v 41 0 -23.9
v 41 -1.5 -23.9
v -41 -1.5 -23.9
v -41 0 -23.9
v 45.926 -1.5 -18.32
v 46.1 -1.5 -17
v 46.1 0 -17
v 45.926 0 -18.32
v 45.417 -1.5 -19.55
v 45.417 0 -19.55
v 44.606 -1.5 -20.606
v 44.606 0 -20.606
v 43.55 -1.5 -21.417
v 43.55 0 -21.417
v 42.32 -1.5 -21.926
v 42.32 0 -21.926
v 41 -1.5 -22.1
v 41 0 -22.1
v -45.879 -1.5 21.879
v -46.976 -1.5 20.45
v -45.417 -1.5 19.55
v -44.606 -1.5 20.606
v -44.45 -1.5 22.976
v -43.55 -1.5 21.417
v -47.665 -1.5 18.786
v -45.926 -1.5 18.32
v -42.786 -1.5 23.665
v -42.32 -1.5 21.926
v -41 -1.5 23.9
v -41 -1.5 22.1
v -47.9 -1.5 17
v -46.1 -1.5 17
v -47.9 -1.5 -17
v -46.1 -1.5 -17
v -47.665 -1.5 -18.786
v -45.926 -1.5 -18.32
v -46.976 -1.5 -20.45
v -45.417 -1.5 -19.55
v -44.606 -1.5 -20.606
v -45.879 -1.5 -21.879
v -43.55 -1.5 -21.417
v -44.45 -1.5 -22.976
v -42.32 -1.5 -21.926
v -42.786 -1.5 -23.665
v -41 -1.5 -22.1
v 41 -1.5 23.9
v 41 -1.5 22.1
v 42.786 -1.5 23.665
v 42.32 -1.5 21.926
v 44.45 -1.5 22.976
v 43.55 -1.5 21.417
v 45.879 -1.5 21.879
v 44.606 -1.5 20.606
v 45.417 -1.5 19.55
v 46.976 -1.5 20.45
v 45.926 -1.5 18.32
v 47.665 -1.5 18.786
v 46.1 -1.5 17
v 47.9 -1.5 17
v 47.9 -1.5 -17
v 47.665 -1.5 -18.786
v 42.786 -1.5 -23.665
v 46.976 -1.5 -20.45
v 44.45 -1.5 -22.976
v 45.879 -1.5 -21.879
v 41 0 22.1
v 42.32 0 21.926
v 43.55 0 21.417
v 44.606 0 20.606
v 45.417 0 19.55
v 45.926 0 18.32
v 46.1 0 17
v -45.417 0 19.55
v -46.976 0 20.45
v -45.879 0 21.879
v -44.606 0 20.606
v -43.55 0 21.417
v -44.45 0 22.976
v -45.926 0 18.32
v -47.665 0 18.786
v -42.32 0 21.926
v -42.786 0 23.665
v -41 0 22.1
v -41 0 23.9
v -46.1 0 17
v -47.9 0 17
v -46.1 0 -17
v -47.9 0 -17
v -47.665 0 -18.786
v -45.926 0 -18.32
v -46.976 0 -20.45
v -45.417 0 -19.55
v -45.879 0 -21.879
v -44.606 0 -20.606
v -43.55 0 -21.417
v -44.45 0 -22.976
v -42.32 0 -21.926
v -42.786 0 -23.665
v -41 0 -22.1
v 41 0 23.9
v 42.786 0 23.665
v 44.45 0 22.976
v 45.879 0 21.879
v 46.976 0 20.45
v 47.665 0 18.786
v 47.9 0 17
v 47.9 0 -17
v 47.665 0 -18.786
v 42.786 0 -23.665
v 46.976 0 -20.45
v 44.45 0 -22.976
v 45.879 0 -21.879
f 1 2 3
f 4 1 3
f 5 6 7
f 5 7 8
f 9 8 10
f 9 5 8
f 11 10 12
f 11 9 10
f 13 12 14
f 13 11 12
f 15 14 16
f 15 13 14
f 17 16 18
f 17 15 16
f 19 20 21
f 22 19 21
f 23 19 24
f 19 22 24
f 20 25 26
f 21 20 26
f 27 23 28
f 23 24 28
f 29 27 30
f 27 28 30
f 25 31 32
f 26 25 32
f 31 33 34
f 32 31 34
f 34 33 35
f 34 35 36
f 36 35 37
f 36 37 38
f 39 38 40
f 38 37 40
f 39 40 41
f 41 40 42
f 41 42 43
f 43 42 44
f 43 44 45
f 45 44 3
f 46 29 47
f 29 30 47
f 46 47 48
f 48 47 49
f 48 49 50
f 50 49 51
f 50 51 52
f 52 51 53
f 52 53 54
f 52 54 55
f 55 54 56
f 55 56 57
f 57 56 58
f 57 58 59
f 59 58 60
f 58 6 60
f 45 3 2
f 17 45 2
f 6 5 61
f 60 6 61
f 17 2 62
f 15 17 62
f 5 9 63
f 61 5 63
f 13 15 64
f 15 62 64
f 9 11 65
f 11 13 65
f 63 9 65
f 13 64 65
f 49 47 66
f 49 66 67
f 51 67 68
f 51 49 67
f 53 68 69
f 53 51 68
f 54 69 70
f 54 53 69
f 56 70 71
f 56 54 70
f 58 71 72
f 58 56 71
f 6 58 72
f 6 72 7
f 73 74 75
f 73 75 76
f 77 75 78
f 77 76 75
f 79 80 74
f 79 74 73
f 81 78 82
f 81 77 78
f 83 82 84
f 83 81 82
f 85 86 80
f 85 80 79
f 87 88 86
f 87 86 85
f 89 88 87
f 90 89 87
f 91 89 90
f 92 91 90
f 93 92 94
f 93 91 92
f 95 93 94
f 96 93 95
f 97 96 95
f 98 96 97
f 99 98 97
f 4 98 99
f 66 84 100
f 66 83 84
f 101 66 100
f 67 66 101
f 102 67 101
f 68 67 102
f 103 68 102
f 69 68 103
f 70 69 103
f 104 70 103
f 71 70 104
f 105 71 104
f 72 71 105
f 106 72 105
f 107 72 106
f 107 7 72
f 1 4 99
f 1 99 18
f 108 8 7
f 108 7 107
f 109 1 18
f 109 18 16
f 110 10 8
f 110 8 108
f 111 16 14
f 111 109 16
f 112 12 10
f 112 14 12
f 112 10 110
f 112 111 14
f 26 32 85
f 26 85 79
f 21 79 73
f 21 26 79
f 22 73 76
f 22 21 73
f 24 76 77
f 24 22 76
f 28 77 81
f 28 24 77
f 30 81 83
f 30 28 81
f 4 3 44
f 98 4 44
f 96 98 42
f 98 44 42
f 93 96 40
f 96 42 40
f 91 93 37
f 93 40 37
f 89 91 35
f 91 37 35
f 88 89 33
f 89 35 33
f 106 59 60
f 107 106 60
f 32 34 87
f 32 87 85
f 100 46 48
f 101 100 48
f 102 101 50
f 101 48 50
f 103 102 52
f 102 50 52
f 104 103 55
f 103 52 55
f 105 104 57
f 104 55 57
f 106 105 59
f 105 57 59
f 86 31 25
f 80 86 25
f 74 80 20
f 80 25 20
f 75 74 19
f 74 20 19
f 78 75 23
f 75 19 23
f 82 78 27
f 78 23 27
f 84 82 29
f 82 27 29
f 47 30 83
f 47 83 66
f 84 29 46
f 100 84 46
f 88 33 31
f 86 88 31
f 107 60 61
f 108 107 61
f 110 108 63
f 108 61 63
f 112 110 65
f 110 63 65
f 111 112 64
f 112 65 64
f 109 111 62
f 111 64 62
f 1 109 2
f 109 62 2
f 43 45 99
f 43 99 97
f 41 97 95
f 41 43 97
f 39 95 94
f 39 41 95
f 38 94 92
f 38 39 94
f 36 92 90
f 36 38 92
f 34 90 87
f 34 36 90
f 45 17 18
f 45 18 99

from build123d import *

# Parameters (mm, degrees)
GASKET_START = -1.5
GASKET_DEPTH = 1.5


with BuildPart() as part:
    # Sketch1 → Gasket (new body)
    with BuildSketch(Plane(origin=(0, 0, 0), x_dir=(1, 0, 0), z_dir=(0, 1, 0)).offset(GASKET_START)):
        with BuildLine():
            Line((-41, -23.9), (41, -23.9))
            ThreePointArc((41, -23.9), (45.87903679, -21.87903679), (47.9, -17))
            Line((47.9, -17), (47.9, 17))
            ThreePointArc((47.9, 17), (45.87903679, 21.87903679), (41, 23.9))
            Line((41, 23.9), (-41, 23.9))
            ThreePointArc((-41, 23.9), (-45.87903679, 21.87903679), (-47.9, 17))
            Line((-47.9, 17), (-47.9, -17))
            ThreePointArc((-47.9, -17), (-45.87903679, -21.87903679), (-41, -23.9))
        make_face()
        with BuildLine():
            Line((-41, -22.1), (41, -22.1))
            ThreePointArc((41, -22.1), (44.606244584, -20.606244584), (46.1, -17))
            Line((46.1, -17), (46.1, 17))
            ThreePointArc((46.1, 17), (44.606244584, 20.606244584), (41, 22.1))
            Line((41, 22.1), (-41, 22.1))
            ThreePointArc((-41, 22.1), (-44.606244584, 20.606244584), (-46.1, 17))
            Line((-46.1, 17), (-46.1, -17))
            ThreePointArc((-46.1, -17), (-44.606244584, -20.606244584), (-41, -22.1))
        make_face(mode=Mode.SUBTRACT)
    extrude(amount=GASKET_DEPTH)


solid = part.part
